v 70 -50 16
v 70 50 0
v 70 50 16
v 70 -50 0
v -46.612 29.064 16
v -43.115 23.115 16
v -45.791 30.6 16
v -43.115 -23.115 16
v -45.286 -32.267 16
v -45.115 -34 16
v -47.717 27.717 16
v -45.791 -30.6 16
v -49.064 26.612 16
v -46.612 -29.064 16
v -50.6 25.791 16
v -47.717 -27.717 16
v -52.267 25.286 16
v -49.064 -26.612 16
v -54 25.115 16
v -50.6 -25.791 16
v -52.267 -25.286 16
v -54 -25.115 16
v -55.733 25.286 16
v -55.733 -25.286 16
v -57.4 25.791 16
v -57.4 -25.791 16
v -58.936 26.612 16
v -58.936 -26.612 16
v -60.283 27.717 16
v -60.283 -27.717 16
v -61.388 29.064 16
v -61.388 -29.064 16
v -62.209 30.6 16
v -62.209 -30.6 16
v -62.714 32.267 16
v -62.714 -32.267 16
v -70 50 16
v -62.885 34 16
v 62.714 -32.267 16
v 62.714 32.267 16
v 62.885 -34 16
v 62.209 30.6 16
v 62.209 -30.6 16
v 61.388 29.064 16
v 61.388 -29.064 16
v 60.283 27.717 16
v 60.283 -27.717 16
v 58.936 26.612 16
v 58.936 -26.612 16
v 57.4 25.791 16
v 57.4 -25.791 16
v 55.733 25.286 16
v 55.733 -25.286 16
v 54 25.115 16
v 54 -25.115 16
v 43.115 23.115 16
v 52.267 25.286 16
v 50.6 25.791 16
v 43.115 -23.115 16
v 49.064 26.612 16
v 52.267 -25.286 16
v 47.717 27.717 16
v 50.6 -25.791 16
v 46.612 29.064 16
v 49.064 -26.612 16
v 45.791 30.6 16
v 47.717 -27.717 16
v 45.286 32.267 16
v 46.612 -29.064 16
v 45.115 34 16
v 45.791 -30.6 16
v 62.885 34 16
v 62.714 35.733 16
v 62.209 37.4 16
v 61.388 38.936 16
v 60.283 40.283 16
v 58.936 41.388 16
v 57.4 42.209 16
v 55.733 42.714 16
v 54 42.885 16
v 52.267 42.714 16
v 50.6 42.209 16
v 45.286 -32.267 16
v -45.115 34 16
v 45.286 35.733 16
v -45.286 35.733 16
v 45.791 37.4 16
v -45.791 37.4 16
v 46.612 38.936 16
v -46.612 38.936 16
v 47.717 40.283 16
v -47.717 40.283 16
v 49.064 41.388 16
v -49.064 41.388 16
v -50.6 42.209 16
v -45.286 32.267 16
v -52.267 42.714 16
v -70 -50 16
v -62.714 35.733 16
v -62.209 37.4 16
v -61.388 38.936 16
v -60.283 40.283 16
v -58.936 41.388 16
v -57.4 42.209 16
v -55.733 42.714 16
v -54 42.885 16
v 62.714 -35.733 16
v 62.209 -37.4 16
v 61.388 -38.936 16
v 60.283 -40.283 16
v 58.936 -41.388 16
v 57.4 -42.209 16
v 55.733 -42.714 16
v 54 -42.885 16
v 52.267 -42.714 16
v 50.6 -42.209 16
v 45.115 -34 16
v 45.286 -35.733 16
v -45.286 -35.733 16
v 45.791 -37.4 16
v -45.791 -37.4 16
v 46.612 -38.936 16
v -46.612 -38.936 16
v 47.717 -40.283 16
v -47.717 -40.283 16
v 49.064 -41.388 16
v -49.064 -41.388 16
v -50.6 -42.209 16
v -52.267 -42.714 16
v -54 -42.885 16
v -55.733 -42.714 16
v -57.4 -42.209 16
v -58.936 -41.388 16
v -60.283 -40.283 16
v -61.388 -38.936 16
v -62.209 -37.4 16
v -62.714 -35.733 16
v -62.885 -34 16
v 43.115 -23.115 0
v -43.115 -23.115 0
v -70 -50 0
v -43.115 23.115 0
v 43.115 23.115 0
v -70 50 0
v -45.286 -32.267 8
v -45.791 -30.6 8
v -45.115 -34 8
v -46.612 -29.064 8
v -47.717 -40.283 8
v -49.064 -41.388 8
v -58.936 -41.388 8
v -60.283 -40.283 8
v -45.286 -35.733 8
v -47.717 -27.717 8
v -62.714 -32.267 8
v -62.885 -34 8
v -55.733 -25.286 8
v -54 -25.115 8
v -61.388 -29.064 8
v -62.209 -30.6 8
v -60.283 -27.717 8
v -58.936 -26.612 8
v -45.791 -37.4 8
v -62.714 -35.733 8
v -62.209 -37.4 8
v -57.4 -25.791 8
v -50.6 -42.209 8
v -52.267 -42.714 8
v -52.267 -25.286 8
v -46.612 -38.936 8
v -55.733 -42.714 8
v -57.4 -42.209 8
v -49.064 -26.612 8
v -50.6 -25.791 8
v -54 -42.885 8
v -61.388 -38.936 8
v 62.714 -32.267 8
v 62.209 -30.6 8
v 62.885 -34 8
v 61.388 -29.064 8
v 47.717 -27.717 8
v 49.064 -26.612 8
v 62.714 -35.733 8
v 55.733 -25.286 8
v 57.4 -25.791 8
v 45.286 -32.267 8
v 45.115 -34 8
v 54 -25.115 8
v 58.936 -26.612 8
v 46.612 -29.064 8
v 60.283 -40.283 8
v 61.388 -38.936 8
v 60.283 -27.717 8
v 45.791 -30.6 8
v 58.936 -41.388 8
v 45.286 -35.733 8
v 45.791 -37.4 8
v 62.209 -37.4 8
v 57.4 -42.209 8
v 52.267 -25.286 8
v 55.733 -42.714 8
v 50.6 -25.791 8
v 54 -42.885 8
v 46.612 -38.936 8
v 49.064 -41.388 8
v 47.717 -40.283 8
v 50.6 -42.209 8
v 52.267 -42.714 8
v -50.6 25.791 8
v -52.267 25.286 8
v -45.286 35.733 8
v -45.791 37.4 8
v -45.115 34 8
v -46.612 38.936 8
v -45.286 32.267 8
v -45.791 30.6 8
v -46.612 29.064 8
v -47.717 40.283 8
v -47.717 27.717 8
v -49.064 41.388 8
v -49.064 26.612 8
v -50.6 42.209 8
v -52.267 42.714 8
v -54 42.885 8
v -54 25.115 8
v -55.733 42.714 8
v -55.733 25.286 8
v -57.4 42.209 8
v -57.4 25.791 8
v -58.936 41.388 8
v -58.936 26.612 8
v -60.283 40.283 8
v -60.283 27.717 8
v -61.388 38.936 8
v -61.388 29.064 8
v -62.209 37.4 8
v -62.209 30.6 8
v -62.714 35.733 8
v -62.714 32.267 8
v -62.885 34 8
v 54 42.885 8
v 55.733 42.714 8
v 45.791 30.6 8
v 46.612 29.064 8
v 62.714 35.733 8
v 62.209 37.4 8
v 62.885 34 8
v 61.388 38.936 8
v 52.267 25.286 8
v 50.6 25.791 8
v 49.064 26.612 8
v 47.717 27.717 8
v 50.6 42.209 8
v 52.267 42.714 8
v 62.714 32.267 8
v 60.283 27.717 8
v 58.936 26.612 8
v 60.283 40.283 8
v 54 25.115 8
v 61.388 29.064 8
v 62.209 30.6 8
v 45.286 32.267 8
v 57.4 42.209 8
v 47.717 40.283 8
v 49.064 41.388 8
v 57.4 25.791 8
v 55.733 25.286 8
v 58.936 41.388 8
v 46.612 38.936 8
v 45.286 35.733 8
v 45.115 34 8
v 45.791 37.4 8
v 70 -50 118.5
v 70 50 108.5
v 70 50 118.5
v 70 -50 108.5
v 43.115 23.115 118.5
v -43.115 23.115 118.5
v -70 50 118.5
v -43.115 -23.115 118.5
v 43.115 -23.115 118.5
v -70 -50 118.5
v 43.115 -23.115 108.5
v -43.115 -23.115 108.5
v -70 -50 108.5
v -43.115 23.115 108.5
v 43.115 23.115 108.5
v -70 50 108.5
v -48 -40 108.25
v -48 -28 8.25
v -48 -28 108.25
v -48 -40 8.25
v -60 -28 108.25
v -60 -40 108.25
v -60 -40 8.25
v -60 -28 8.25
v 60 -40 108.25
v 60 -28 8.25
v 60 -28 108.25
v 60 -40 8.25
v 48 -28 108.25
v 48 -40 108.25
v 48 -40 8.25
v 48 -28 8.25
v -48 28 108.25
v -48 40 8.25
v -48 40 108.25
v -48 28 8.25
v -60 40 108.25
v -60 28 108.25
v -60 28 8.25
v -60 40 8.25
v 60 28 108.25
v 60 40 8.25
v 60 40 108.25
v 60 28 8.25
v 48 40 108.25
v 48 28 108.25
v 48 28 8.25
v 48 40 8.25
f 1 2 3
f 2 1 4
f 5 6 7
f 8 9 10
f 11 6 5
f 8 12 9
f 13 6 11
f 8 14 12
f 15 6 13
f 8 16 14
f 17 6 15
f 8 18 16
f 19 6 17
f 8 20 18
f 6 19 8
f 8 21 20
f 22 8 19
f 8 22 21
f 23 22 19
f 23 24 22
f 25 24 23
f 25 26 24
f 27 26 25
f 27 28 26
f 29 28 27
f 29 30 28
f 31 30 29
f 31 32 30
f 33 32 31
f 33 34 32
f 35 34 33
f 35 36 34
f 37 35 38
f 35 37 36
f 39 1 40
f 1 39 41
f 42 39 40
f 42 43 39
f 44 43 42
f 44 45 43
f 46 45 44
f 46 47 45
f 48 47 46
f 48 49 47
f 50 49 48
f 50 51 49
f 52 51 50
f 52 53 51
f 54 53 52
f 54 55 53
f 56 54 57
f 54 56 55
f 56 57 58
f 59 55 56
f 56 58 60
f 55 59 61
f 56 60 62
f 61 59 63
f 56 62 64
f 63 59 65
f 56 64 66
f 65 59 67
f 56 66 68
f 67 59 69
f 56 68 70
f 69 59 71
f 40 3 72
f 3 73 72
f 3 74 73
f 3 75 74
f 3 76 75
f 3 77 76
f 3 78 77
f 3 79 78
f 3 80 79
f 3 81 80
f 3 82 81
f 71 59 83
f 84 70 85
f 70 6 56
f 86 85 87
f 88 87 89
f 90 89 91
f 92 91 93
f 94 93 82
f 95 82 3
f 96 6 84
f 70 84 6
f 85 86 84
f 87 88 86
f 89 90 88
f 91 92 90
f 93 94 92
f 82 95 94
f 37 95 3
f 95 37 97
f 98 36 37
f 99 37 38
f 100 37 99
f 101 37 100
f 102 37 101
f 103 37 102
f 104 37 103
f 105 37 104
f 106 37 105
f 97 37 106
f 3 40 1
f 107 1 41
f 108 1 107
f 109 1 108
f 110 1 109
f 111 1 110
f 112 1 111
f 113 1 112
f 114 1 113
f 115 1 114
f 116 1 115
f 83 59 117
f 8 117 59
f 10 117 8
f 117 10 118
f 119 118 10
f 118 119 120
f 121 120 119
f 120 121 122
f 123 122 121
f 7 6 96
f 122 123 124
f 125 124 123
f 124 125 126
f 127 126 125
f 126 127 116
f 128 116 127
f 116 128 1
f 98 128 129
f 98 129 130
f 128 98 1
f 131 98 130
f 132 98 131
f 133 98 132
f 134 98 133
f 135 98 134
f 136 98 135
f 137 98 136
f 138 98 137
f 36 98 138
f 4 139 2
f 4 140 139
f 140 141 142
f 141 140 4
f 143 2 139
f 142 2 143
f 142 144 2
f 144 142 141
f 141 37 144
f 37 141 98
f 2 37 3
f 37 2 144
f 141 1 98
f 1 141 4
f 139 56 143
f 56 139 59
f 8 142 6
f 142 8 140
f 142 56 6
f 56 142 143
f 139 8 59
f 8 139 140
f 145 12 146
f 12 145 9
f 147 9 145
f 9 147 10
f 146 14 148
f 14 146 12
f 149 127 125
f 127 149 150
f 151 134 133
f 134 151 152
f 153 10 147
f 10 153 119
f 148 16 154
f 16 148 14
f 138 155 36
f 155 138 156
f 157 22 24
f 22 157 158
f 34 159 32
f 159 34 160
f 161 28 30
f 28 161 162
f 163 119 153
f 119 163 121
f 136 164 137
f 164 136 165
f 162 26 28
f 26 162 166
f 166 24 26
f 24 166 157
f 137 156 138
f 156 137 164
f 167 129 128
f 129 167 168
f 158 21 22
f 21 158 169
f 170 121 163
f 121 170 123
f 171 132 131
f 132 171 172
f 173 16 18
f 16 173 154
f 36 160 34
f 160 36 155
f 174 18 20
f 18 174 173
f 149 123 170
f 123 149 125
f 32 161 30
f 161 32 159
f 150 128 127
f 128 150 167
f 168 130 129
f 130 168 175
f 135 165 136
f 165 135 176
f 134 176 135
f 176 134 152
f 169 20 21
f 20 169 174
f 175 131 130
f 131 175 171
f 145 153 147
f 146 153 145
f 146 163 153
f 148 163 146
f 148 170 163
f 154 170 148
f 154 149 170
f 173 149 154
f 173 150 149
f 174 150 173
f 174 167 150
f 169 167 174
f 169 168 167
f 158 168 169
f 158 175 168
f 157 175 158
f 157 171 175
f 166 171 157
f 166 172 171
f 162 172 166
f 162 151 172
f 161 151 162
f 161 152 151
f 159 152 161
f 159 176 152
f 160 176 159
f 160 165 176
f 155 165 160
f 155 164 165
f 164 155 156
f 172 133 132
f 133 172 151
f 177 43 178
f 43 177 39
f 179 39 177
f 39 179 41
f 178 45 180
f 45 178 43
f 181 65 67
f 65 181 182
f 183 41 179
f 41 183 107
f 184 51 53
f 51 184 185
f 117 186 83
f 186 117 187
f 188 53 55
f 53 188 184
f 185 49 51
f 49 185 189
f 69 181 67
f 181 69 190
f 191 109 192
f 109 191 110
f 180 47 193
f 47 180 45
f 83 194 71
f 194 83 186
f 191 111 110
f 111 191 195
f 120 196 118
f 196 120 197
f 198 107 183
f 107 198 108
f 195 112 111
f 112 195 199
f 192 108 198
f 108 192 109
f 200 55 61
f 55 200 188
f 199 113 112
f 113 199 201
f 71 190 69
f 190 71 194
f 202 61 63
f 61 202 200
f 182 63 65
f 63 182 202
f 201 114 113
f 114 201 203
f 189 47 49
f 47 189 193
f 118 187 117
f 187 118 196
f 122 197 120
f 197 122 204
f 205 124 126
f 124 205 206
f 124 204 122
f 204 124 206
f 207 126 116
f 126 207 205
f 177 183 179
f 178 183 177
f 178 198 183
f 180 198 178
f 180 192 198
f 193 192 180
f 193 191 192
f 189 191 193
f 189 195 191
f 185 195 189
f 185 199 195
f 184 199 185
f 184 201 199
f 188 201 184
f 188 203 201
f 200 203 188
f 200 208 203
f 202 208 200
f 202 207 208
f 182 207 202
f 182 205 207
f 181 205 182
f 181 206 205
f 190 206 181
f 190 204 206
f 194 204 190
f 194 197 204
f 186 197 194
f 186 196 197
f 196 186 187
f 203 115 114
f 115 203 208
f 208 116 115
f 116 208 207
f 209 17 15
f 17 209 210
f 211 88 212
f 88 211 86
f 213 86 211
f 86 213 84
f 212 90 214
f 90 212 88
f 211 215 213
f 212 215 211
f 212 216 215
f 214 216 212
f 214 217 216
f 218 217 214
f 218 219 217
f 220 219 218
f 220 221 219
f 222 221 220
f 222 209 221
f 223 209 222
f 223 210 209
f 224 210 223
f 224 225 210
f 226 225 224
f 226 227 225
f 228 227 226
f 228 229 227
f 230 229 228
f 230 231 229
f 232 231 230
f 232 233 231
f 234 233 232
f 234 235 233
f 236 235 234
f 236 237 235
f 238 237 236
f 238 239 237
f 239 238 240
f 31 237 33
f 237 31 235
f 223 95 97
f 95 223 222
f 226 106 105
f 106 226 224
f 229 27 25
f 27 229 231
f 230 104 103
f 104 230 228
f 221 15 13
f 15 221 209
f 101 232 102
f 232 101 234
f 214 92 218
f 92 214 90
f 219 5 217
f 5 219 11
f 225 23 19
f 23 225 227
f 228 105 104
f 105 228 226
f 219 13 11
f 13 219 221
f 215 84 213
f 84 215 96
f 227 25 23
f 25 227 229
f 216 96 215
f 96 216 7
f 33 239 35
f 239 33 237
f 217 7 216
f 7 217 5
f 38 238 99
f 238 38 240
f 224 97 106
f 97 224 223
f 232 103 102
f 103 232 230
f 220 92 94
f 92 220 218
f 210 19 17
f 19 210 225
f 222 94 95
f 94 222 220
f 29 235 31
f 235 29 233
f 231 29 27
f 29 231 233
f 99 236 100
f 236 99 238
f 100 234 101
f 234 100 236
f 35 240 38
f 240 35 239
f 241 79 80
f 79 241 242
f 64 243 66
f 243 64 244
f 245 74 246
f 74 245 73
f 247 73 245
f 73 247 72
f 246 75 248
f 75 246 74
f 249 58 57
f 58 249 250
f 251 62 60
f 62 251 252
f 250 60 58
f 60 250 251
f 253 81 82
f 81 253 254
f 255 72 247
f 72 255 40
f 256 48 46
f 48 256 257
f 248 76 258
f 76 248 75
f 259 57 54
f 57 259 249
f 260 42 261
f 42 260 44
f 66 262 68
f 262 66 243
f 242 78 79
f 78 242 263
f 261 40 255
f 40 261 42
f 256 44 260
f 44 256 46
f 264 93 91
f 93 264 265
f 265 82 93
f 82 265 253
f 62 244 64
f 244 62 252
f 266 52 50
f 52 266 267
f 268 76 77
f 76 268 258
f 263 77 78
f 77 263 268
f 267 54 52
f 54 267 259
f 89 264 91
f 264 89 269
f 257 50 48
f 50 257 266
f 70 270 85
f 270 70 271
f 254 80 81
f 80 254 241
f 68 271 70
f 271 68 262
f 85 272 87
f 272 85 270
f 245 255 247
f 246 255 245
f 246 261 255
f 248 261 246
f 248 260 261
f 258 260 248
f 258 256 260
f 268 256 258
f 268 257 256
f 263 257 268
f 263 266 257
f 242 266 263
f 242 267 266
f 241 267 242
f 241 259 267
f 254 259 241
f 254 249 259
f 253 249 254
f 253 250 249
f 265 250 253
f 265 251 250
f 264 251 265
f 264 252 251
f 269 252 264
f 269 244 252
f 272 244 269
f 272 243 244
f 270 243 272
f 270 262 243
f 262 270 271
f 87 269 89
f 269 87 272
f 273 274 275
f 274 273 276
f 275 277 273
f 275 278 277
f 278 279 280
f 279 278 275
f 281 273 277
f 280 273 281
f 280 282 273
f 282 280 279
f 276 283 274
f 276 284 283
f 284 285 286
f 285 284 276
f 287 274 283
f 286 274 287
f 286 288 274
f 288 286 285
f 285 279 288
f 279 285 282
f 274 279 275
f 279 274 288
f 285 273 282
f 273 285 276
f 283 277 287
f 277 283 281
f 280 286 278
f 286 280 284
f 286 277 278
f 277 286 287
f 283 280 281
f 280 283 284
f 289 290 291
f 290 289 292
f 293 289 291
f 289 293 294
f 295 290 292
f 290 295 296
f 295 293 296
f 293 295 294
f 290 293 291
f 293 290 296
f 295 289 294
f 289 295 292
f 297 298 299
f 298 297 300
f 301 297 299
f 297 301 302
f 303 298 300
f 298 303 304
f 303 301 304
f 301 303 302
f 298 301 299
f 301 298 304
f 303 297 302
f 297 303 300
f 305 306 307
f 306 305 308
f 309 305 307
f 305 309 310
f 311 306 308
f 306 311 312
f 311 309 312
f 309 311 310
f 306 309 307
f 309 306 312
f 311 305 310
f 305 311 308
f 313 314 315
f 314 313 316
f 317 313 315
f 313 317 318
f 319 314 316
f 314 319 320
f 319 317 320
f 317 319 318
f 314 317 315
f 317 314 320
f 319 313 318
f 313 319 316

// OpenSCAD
$fn = 32;

// ------------------------------------------------------------------------
// Frame cube: base 140 x 100 mm, posts 100 mm tall
// Every part is its own module, assembly() places every instance.
// ------------------------------------------------------------------------

// --- part 1 ---
module base_frame() {
  difference() {
    translate([-70, -50, 0]) cube([140, 100, 16]);
    translate([-43.115, -23.115, -1]) cube([86.23, 46.23, 18]);
    translate([-54, -34, 8]) cylinder(h = 9, d = 17.77);
    translate([54, -34, 8]) cylinder(h = 9, d = 17.77);
    translate([-54, 34, 8]) cylinder(h = 9, d = 17.77);
    translate([54, 34, 8]) cylinder(h = 9, d = 17.77);
  }
}

// --- part 2 ---
module corner_post() {
  translate([-6, -6, 0]) cube([12, 12, 100]);
}

// --- part 3 ---
module top_frame() {
  difference() {
    translate([-70, -50, 0]) cube([140, 100, 10]);
    translate([-43.115, -23.115, -1]) cube([86.23, 46.23, 12]);
  }
}

// --- assembly ---
module assembly() {
  color([0.80, 0.24, 0.20]) translate([0, 0, 0]) rotate([0, 0, 0]) base_frame();
  color([0.20, 0.45, 0.75]) translate([-54, -34, 8.25]) rotate([0, 0, 0]) corner_post();
  color([0.25, 0.62, 0.32]) translate([54, -34, 8.25]) rotate([0, 0, 0]) corner_post();
  color([0.92, 0.70, 0.18]) translate([-54, 34, 8.25]) rotate([0, 0, 0]) corner_post();
  color([0.58, 0.35, 0.70]) translate([54, 34, 8.25]) rotate([0, 0, 0]) corner_post();
  color([0.16, 0.66, 0.66]) translate([0, 0, 108.5]) rotate([0, 0, 0]) top_frame();
}

assembly();
